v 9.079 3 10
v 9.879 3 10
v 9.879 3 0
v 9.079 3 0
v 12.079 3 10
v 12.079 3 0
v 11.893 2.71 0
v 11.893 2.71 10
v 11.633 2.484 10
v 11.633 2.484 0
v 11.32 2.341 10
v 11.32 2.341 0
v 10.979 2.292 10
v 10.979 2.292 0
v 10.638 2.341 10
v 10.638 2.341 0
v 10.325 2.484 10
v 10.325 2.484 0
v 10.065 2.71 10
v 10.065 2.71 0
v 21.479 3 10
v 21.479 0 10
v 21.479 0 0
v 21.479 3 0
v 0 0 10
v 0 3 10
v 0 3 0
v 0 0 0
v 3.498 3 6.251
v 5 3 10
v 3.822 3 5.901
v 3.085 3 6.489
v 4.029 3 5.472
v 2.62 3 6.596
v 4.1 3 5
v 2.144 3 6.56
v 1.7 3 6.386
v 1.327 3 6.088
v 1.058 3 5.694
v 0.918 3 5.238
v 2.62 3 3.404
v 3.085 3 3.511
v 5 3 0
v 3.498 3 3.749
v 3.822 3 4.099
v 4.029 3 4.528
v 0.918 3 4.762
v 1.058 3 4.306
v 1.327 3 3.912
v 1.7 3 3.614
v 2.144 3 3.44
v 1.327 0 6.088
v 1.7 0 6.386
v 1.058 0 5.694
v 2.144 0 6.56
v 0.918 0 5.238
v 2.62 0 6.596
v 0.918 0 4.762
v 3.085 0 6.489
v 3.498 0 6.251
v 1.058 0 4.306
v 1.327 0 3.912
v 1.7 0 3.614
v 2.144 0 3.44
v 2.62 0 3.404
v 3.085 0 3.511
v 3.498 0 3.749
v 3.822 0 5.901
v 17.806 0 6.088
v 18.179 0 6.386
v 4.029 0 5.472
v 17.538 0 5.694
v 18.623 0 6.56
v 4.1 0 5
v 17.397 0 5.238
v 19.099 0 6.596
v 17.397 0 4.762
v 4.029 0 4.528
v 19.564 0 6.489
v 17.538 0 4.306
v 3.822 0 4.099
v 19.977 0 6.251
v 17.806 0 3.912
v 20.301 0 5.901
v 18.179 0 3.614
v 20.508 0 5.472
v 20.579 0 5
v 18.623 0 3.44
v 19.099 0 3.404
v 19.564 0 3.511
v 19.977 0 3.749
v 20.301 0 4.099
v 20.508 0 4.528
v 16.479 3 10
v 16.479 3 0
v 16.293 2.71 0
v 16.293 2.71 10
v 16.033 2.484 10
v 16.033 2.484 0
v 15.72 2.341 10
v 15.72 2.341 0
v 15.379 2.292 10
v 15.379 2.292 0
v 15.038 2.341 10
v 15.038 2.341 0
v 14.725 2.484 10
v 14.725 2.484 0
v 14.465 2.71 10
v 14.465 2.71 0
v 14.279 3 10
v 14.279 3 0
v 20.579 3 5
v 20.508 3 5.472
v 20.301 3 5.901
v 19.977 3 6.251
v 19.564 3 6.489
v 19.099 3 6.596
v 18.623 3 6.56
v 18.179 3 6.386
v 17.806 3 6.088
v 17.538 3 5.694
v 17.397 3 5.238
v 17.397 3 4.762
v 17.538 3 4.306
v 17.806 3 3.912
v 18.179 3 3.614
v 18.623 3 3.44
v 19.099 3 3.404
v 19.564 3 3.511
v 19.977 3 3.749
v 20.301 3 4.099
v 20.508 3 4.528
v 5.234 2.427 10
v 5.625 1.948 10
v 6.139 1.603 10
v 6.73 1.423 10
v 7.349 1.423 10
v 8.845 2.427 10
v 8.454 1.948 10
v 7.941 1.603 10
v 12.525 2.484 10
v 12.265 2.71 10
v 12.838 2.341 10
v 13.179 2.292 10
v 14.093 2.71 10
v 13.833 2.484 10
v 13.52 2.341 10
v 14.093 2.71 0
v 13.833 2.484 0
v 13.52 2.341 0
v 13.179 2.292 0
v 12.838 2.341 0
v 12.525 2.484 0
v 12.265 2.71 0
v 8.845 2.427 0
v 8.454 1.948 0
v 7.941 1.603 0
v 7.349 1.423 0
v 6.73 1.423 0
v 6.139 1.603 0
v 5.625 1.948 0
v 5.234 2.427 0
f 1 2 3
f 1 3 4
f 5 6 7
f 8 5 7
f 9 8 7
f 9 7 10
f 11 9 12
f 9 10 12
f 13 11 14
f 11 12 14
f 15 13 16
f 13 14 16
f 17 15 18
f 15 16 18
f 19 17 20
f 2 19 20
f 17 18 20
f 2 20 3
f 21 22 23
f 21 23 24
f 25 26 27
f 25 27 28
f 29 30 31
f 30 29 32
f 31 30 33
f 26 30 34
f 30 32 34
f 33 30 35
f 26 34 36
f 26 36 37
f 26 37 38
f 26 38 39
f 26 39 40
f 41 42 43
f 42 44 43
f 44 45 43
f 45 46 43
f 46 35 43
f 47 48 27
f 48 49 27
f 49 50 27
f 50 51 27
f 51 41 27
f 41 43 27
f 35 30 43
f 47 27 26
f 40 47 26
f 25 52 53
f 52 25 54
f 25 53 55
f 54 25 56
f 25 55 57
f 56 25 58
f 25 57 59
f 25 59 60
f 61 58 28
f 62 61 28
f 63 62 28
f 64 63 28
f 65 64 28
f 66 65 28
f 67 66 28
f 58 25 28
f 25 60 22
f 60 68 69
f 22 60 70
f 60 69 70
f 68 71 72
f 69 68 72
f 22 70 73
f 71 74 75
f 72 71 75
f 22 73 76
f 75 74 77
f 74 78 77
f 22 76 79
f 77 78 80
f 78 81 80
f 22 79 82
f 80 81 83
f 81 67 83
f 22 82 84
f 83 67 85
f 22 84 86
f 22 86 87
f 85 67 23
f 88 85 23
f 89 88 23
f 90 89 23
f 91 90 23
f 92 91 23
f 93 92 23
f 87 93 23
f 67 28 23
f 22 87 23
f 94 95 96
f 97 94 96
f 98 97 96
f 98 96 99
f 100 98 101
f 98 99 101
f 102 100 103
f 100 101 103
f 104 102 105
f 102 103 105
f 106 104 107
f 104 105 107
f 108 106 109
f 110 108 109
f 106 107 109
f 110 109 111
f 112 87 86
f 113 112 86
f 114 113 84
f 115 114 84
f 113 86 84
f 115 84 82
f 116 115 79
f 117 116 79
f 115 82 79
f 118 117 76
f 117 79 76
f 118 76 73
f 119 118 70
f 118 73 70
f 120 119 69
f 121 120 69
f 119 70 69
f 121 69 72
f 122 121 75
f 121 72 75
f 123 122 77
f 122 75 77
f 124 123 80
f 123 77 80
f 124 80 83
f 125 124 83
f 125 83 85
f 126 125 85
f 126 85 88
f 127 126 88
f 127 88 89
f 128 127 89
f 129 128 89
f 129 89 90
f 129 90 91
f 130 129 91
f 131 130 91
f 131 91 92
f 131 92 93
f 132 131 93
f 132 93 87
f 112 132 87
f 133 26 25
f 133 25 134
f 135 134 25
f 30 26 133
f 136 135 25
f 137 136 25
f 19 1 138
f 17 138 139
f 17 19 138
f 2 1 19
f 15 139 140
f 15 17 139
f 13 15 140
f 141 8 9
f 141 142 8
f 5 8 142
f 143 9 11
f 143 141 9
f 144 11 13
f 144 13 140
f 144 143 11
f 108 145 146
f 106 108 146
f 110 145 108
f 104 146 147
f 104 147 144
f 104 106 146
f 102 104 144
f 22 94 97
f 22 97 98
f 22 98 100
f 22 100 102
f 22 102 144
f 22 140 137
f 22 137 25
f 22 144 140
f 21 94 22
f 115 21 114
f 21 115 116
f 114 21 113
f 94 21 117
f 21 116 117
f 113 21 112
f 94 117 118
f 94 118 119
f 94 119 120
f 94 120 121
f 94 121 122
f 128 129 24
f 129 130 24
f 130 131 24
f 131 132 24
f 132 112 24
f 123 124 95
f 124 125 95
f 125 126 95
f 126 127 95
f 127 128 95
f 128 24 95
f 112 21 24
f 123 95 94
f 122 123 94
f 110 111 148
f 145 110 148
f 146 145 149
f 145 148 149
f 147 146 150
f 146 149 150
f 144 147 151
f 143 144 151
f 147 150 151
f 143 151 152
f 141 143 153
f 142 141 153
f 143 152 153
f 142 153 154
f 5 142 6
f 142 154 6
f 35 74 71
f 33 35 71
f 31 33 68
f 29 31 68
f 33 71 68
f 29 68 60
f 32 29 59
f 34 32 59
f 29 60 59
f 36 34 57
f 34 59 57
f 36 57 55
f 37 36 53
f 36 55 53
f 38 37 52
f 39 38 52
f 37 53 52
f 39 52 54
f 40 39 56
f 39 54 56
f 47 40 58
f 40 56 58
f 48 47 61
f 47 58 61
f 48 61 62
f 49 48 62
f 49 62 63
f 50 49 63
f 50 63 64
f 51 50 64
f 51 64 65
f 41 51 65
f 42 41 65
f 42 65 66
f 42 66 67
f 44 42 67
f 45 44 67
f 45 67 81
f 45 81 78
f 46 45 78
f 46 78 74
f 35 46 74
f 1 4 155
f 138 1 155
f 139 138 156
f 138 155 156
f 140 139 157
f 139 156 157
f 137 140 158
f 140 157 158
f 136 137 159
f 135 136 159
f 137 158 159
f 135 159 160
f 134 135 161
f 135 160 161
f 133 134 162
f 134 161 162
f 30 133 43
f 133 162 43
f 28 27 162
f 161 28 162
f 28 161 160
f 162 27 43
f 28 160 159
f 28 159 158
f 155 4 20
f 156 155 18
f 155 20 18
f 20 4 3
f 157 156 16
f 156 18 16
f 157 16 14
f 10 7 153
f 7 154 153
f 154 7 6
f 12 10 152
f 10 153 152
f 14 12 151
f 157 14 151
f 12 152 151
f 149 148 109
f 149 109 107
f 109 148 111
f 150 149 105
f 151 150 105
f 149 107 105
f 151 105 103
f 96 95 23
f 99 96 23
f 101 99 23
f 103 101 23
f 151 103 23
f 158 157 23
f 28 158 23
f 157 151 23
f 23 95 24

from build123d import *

# Parameters (mm, degrees)
BOSS_EXTRUDE1_DEPTH = 10
SKETCH2_R           = 1.6
CUT_EXTRUDE1_DEPTH  = 24.882141932


with BuildPart() as part:
    # Sketch1 → Boss-Extrude1 (new body)
    with BuildSketch(Plane.XY):
        with BuildLine():
            Line((0, 0), (21.479215611, 0))
            Line((21.479215611, 0), (21.479215611, 3))
            Line((21.479215611, 3), (16.479215611, 3))
            ThreePointArc((16.479215611, 3), (15.379215611, 2.291695403), (14.279215611, 3))
            ThreePointArc((14.279215611, 3), (13.179215611, 2.291695403), (12.079215611, 3))
            ThreePointArc((12.079215611, 3), (10.979215611, 2.291695403), (9.879215611, 3))
            Line((9.879215611, 3), (9.079215611, 3))
            ThreePointArc((9.079215611, 3), (7.039607805, 1.4), (5, 3))
            Line((5, 3), (0, 3))
            Line((0, 3), (0, 0))
        make_face()
    extrude(amount=BOSS_EXTRUDE1_DEPTH)

    # Sketch2 → Cut-Extrude1 (cut, through all)
    with BuildSketch(Plane.XZ):
        with Locations((2.5, 5)):
            Circle(SKETCH2_R)
        with Locations((18.979215611, 5)):
            Circle(SKETCH2_R)
    extrude(amount=-CUT_EXTRUDE1_DEPTH, mode=Mode.SUBTRACT)


solid = part.part
